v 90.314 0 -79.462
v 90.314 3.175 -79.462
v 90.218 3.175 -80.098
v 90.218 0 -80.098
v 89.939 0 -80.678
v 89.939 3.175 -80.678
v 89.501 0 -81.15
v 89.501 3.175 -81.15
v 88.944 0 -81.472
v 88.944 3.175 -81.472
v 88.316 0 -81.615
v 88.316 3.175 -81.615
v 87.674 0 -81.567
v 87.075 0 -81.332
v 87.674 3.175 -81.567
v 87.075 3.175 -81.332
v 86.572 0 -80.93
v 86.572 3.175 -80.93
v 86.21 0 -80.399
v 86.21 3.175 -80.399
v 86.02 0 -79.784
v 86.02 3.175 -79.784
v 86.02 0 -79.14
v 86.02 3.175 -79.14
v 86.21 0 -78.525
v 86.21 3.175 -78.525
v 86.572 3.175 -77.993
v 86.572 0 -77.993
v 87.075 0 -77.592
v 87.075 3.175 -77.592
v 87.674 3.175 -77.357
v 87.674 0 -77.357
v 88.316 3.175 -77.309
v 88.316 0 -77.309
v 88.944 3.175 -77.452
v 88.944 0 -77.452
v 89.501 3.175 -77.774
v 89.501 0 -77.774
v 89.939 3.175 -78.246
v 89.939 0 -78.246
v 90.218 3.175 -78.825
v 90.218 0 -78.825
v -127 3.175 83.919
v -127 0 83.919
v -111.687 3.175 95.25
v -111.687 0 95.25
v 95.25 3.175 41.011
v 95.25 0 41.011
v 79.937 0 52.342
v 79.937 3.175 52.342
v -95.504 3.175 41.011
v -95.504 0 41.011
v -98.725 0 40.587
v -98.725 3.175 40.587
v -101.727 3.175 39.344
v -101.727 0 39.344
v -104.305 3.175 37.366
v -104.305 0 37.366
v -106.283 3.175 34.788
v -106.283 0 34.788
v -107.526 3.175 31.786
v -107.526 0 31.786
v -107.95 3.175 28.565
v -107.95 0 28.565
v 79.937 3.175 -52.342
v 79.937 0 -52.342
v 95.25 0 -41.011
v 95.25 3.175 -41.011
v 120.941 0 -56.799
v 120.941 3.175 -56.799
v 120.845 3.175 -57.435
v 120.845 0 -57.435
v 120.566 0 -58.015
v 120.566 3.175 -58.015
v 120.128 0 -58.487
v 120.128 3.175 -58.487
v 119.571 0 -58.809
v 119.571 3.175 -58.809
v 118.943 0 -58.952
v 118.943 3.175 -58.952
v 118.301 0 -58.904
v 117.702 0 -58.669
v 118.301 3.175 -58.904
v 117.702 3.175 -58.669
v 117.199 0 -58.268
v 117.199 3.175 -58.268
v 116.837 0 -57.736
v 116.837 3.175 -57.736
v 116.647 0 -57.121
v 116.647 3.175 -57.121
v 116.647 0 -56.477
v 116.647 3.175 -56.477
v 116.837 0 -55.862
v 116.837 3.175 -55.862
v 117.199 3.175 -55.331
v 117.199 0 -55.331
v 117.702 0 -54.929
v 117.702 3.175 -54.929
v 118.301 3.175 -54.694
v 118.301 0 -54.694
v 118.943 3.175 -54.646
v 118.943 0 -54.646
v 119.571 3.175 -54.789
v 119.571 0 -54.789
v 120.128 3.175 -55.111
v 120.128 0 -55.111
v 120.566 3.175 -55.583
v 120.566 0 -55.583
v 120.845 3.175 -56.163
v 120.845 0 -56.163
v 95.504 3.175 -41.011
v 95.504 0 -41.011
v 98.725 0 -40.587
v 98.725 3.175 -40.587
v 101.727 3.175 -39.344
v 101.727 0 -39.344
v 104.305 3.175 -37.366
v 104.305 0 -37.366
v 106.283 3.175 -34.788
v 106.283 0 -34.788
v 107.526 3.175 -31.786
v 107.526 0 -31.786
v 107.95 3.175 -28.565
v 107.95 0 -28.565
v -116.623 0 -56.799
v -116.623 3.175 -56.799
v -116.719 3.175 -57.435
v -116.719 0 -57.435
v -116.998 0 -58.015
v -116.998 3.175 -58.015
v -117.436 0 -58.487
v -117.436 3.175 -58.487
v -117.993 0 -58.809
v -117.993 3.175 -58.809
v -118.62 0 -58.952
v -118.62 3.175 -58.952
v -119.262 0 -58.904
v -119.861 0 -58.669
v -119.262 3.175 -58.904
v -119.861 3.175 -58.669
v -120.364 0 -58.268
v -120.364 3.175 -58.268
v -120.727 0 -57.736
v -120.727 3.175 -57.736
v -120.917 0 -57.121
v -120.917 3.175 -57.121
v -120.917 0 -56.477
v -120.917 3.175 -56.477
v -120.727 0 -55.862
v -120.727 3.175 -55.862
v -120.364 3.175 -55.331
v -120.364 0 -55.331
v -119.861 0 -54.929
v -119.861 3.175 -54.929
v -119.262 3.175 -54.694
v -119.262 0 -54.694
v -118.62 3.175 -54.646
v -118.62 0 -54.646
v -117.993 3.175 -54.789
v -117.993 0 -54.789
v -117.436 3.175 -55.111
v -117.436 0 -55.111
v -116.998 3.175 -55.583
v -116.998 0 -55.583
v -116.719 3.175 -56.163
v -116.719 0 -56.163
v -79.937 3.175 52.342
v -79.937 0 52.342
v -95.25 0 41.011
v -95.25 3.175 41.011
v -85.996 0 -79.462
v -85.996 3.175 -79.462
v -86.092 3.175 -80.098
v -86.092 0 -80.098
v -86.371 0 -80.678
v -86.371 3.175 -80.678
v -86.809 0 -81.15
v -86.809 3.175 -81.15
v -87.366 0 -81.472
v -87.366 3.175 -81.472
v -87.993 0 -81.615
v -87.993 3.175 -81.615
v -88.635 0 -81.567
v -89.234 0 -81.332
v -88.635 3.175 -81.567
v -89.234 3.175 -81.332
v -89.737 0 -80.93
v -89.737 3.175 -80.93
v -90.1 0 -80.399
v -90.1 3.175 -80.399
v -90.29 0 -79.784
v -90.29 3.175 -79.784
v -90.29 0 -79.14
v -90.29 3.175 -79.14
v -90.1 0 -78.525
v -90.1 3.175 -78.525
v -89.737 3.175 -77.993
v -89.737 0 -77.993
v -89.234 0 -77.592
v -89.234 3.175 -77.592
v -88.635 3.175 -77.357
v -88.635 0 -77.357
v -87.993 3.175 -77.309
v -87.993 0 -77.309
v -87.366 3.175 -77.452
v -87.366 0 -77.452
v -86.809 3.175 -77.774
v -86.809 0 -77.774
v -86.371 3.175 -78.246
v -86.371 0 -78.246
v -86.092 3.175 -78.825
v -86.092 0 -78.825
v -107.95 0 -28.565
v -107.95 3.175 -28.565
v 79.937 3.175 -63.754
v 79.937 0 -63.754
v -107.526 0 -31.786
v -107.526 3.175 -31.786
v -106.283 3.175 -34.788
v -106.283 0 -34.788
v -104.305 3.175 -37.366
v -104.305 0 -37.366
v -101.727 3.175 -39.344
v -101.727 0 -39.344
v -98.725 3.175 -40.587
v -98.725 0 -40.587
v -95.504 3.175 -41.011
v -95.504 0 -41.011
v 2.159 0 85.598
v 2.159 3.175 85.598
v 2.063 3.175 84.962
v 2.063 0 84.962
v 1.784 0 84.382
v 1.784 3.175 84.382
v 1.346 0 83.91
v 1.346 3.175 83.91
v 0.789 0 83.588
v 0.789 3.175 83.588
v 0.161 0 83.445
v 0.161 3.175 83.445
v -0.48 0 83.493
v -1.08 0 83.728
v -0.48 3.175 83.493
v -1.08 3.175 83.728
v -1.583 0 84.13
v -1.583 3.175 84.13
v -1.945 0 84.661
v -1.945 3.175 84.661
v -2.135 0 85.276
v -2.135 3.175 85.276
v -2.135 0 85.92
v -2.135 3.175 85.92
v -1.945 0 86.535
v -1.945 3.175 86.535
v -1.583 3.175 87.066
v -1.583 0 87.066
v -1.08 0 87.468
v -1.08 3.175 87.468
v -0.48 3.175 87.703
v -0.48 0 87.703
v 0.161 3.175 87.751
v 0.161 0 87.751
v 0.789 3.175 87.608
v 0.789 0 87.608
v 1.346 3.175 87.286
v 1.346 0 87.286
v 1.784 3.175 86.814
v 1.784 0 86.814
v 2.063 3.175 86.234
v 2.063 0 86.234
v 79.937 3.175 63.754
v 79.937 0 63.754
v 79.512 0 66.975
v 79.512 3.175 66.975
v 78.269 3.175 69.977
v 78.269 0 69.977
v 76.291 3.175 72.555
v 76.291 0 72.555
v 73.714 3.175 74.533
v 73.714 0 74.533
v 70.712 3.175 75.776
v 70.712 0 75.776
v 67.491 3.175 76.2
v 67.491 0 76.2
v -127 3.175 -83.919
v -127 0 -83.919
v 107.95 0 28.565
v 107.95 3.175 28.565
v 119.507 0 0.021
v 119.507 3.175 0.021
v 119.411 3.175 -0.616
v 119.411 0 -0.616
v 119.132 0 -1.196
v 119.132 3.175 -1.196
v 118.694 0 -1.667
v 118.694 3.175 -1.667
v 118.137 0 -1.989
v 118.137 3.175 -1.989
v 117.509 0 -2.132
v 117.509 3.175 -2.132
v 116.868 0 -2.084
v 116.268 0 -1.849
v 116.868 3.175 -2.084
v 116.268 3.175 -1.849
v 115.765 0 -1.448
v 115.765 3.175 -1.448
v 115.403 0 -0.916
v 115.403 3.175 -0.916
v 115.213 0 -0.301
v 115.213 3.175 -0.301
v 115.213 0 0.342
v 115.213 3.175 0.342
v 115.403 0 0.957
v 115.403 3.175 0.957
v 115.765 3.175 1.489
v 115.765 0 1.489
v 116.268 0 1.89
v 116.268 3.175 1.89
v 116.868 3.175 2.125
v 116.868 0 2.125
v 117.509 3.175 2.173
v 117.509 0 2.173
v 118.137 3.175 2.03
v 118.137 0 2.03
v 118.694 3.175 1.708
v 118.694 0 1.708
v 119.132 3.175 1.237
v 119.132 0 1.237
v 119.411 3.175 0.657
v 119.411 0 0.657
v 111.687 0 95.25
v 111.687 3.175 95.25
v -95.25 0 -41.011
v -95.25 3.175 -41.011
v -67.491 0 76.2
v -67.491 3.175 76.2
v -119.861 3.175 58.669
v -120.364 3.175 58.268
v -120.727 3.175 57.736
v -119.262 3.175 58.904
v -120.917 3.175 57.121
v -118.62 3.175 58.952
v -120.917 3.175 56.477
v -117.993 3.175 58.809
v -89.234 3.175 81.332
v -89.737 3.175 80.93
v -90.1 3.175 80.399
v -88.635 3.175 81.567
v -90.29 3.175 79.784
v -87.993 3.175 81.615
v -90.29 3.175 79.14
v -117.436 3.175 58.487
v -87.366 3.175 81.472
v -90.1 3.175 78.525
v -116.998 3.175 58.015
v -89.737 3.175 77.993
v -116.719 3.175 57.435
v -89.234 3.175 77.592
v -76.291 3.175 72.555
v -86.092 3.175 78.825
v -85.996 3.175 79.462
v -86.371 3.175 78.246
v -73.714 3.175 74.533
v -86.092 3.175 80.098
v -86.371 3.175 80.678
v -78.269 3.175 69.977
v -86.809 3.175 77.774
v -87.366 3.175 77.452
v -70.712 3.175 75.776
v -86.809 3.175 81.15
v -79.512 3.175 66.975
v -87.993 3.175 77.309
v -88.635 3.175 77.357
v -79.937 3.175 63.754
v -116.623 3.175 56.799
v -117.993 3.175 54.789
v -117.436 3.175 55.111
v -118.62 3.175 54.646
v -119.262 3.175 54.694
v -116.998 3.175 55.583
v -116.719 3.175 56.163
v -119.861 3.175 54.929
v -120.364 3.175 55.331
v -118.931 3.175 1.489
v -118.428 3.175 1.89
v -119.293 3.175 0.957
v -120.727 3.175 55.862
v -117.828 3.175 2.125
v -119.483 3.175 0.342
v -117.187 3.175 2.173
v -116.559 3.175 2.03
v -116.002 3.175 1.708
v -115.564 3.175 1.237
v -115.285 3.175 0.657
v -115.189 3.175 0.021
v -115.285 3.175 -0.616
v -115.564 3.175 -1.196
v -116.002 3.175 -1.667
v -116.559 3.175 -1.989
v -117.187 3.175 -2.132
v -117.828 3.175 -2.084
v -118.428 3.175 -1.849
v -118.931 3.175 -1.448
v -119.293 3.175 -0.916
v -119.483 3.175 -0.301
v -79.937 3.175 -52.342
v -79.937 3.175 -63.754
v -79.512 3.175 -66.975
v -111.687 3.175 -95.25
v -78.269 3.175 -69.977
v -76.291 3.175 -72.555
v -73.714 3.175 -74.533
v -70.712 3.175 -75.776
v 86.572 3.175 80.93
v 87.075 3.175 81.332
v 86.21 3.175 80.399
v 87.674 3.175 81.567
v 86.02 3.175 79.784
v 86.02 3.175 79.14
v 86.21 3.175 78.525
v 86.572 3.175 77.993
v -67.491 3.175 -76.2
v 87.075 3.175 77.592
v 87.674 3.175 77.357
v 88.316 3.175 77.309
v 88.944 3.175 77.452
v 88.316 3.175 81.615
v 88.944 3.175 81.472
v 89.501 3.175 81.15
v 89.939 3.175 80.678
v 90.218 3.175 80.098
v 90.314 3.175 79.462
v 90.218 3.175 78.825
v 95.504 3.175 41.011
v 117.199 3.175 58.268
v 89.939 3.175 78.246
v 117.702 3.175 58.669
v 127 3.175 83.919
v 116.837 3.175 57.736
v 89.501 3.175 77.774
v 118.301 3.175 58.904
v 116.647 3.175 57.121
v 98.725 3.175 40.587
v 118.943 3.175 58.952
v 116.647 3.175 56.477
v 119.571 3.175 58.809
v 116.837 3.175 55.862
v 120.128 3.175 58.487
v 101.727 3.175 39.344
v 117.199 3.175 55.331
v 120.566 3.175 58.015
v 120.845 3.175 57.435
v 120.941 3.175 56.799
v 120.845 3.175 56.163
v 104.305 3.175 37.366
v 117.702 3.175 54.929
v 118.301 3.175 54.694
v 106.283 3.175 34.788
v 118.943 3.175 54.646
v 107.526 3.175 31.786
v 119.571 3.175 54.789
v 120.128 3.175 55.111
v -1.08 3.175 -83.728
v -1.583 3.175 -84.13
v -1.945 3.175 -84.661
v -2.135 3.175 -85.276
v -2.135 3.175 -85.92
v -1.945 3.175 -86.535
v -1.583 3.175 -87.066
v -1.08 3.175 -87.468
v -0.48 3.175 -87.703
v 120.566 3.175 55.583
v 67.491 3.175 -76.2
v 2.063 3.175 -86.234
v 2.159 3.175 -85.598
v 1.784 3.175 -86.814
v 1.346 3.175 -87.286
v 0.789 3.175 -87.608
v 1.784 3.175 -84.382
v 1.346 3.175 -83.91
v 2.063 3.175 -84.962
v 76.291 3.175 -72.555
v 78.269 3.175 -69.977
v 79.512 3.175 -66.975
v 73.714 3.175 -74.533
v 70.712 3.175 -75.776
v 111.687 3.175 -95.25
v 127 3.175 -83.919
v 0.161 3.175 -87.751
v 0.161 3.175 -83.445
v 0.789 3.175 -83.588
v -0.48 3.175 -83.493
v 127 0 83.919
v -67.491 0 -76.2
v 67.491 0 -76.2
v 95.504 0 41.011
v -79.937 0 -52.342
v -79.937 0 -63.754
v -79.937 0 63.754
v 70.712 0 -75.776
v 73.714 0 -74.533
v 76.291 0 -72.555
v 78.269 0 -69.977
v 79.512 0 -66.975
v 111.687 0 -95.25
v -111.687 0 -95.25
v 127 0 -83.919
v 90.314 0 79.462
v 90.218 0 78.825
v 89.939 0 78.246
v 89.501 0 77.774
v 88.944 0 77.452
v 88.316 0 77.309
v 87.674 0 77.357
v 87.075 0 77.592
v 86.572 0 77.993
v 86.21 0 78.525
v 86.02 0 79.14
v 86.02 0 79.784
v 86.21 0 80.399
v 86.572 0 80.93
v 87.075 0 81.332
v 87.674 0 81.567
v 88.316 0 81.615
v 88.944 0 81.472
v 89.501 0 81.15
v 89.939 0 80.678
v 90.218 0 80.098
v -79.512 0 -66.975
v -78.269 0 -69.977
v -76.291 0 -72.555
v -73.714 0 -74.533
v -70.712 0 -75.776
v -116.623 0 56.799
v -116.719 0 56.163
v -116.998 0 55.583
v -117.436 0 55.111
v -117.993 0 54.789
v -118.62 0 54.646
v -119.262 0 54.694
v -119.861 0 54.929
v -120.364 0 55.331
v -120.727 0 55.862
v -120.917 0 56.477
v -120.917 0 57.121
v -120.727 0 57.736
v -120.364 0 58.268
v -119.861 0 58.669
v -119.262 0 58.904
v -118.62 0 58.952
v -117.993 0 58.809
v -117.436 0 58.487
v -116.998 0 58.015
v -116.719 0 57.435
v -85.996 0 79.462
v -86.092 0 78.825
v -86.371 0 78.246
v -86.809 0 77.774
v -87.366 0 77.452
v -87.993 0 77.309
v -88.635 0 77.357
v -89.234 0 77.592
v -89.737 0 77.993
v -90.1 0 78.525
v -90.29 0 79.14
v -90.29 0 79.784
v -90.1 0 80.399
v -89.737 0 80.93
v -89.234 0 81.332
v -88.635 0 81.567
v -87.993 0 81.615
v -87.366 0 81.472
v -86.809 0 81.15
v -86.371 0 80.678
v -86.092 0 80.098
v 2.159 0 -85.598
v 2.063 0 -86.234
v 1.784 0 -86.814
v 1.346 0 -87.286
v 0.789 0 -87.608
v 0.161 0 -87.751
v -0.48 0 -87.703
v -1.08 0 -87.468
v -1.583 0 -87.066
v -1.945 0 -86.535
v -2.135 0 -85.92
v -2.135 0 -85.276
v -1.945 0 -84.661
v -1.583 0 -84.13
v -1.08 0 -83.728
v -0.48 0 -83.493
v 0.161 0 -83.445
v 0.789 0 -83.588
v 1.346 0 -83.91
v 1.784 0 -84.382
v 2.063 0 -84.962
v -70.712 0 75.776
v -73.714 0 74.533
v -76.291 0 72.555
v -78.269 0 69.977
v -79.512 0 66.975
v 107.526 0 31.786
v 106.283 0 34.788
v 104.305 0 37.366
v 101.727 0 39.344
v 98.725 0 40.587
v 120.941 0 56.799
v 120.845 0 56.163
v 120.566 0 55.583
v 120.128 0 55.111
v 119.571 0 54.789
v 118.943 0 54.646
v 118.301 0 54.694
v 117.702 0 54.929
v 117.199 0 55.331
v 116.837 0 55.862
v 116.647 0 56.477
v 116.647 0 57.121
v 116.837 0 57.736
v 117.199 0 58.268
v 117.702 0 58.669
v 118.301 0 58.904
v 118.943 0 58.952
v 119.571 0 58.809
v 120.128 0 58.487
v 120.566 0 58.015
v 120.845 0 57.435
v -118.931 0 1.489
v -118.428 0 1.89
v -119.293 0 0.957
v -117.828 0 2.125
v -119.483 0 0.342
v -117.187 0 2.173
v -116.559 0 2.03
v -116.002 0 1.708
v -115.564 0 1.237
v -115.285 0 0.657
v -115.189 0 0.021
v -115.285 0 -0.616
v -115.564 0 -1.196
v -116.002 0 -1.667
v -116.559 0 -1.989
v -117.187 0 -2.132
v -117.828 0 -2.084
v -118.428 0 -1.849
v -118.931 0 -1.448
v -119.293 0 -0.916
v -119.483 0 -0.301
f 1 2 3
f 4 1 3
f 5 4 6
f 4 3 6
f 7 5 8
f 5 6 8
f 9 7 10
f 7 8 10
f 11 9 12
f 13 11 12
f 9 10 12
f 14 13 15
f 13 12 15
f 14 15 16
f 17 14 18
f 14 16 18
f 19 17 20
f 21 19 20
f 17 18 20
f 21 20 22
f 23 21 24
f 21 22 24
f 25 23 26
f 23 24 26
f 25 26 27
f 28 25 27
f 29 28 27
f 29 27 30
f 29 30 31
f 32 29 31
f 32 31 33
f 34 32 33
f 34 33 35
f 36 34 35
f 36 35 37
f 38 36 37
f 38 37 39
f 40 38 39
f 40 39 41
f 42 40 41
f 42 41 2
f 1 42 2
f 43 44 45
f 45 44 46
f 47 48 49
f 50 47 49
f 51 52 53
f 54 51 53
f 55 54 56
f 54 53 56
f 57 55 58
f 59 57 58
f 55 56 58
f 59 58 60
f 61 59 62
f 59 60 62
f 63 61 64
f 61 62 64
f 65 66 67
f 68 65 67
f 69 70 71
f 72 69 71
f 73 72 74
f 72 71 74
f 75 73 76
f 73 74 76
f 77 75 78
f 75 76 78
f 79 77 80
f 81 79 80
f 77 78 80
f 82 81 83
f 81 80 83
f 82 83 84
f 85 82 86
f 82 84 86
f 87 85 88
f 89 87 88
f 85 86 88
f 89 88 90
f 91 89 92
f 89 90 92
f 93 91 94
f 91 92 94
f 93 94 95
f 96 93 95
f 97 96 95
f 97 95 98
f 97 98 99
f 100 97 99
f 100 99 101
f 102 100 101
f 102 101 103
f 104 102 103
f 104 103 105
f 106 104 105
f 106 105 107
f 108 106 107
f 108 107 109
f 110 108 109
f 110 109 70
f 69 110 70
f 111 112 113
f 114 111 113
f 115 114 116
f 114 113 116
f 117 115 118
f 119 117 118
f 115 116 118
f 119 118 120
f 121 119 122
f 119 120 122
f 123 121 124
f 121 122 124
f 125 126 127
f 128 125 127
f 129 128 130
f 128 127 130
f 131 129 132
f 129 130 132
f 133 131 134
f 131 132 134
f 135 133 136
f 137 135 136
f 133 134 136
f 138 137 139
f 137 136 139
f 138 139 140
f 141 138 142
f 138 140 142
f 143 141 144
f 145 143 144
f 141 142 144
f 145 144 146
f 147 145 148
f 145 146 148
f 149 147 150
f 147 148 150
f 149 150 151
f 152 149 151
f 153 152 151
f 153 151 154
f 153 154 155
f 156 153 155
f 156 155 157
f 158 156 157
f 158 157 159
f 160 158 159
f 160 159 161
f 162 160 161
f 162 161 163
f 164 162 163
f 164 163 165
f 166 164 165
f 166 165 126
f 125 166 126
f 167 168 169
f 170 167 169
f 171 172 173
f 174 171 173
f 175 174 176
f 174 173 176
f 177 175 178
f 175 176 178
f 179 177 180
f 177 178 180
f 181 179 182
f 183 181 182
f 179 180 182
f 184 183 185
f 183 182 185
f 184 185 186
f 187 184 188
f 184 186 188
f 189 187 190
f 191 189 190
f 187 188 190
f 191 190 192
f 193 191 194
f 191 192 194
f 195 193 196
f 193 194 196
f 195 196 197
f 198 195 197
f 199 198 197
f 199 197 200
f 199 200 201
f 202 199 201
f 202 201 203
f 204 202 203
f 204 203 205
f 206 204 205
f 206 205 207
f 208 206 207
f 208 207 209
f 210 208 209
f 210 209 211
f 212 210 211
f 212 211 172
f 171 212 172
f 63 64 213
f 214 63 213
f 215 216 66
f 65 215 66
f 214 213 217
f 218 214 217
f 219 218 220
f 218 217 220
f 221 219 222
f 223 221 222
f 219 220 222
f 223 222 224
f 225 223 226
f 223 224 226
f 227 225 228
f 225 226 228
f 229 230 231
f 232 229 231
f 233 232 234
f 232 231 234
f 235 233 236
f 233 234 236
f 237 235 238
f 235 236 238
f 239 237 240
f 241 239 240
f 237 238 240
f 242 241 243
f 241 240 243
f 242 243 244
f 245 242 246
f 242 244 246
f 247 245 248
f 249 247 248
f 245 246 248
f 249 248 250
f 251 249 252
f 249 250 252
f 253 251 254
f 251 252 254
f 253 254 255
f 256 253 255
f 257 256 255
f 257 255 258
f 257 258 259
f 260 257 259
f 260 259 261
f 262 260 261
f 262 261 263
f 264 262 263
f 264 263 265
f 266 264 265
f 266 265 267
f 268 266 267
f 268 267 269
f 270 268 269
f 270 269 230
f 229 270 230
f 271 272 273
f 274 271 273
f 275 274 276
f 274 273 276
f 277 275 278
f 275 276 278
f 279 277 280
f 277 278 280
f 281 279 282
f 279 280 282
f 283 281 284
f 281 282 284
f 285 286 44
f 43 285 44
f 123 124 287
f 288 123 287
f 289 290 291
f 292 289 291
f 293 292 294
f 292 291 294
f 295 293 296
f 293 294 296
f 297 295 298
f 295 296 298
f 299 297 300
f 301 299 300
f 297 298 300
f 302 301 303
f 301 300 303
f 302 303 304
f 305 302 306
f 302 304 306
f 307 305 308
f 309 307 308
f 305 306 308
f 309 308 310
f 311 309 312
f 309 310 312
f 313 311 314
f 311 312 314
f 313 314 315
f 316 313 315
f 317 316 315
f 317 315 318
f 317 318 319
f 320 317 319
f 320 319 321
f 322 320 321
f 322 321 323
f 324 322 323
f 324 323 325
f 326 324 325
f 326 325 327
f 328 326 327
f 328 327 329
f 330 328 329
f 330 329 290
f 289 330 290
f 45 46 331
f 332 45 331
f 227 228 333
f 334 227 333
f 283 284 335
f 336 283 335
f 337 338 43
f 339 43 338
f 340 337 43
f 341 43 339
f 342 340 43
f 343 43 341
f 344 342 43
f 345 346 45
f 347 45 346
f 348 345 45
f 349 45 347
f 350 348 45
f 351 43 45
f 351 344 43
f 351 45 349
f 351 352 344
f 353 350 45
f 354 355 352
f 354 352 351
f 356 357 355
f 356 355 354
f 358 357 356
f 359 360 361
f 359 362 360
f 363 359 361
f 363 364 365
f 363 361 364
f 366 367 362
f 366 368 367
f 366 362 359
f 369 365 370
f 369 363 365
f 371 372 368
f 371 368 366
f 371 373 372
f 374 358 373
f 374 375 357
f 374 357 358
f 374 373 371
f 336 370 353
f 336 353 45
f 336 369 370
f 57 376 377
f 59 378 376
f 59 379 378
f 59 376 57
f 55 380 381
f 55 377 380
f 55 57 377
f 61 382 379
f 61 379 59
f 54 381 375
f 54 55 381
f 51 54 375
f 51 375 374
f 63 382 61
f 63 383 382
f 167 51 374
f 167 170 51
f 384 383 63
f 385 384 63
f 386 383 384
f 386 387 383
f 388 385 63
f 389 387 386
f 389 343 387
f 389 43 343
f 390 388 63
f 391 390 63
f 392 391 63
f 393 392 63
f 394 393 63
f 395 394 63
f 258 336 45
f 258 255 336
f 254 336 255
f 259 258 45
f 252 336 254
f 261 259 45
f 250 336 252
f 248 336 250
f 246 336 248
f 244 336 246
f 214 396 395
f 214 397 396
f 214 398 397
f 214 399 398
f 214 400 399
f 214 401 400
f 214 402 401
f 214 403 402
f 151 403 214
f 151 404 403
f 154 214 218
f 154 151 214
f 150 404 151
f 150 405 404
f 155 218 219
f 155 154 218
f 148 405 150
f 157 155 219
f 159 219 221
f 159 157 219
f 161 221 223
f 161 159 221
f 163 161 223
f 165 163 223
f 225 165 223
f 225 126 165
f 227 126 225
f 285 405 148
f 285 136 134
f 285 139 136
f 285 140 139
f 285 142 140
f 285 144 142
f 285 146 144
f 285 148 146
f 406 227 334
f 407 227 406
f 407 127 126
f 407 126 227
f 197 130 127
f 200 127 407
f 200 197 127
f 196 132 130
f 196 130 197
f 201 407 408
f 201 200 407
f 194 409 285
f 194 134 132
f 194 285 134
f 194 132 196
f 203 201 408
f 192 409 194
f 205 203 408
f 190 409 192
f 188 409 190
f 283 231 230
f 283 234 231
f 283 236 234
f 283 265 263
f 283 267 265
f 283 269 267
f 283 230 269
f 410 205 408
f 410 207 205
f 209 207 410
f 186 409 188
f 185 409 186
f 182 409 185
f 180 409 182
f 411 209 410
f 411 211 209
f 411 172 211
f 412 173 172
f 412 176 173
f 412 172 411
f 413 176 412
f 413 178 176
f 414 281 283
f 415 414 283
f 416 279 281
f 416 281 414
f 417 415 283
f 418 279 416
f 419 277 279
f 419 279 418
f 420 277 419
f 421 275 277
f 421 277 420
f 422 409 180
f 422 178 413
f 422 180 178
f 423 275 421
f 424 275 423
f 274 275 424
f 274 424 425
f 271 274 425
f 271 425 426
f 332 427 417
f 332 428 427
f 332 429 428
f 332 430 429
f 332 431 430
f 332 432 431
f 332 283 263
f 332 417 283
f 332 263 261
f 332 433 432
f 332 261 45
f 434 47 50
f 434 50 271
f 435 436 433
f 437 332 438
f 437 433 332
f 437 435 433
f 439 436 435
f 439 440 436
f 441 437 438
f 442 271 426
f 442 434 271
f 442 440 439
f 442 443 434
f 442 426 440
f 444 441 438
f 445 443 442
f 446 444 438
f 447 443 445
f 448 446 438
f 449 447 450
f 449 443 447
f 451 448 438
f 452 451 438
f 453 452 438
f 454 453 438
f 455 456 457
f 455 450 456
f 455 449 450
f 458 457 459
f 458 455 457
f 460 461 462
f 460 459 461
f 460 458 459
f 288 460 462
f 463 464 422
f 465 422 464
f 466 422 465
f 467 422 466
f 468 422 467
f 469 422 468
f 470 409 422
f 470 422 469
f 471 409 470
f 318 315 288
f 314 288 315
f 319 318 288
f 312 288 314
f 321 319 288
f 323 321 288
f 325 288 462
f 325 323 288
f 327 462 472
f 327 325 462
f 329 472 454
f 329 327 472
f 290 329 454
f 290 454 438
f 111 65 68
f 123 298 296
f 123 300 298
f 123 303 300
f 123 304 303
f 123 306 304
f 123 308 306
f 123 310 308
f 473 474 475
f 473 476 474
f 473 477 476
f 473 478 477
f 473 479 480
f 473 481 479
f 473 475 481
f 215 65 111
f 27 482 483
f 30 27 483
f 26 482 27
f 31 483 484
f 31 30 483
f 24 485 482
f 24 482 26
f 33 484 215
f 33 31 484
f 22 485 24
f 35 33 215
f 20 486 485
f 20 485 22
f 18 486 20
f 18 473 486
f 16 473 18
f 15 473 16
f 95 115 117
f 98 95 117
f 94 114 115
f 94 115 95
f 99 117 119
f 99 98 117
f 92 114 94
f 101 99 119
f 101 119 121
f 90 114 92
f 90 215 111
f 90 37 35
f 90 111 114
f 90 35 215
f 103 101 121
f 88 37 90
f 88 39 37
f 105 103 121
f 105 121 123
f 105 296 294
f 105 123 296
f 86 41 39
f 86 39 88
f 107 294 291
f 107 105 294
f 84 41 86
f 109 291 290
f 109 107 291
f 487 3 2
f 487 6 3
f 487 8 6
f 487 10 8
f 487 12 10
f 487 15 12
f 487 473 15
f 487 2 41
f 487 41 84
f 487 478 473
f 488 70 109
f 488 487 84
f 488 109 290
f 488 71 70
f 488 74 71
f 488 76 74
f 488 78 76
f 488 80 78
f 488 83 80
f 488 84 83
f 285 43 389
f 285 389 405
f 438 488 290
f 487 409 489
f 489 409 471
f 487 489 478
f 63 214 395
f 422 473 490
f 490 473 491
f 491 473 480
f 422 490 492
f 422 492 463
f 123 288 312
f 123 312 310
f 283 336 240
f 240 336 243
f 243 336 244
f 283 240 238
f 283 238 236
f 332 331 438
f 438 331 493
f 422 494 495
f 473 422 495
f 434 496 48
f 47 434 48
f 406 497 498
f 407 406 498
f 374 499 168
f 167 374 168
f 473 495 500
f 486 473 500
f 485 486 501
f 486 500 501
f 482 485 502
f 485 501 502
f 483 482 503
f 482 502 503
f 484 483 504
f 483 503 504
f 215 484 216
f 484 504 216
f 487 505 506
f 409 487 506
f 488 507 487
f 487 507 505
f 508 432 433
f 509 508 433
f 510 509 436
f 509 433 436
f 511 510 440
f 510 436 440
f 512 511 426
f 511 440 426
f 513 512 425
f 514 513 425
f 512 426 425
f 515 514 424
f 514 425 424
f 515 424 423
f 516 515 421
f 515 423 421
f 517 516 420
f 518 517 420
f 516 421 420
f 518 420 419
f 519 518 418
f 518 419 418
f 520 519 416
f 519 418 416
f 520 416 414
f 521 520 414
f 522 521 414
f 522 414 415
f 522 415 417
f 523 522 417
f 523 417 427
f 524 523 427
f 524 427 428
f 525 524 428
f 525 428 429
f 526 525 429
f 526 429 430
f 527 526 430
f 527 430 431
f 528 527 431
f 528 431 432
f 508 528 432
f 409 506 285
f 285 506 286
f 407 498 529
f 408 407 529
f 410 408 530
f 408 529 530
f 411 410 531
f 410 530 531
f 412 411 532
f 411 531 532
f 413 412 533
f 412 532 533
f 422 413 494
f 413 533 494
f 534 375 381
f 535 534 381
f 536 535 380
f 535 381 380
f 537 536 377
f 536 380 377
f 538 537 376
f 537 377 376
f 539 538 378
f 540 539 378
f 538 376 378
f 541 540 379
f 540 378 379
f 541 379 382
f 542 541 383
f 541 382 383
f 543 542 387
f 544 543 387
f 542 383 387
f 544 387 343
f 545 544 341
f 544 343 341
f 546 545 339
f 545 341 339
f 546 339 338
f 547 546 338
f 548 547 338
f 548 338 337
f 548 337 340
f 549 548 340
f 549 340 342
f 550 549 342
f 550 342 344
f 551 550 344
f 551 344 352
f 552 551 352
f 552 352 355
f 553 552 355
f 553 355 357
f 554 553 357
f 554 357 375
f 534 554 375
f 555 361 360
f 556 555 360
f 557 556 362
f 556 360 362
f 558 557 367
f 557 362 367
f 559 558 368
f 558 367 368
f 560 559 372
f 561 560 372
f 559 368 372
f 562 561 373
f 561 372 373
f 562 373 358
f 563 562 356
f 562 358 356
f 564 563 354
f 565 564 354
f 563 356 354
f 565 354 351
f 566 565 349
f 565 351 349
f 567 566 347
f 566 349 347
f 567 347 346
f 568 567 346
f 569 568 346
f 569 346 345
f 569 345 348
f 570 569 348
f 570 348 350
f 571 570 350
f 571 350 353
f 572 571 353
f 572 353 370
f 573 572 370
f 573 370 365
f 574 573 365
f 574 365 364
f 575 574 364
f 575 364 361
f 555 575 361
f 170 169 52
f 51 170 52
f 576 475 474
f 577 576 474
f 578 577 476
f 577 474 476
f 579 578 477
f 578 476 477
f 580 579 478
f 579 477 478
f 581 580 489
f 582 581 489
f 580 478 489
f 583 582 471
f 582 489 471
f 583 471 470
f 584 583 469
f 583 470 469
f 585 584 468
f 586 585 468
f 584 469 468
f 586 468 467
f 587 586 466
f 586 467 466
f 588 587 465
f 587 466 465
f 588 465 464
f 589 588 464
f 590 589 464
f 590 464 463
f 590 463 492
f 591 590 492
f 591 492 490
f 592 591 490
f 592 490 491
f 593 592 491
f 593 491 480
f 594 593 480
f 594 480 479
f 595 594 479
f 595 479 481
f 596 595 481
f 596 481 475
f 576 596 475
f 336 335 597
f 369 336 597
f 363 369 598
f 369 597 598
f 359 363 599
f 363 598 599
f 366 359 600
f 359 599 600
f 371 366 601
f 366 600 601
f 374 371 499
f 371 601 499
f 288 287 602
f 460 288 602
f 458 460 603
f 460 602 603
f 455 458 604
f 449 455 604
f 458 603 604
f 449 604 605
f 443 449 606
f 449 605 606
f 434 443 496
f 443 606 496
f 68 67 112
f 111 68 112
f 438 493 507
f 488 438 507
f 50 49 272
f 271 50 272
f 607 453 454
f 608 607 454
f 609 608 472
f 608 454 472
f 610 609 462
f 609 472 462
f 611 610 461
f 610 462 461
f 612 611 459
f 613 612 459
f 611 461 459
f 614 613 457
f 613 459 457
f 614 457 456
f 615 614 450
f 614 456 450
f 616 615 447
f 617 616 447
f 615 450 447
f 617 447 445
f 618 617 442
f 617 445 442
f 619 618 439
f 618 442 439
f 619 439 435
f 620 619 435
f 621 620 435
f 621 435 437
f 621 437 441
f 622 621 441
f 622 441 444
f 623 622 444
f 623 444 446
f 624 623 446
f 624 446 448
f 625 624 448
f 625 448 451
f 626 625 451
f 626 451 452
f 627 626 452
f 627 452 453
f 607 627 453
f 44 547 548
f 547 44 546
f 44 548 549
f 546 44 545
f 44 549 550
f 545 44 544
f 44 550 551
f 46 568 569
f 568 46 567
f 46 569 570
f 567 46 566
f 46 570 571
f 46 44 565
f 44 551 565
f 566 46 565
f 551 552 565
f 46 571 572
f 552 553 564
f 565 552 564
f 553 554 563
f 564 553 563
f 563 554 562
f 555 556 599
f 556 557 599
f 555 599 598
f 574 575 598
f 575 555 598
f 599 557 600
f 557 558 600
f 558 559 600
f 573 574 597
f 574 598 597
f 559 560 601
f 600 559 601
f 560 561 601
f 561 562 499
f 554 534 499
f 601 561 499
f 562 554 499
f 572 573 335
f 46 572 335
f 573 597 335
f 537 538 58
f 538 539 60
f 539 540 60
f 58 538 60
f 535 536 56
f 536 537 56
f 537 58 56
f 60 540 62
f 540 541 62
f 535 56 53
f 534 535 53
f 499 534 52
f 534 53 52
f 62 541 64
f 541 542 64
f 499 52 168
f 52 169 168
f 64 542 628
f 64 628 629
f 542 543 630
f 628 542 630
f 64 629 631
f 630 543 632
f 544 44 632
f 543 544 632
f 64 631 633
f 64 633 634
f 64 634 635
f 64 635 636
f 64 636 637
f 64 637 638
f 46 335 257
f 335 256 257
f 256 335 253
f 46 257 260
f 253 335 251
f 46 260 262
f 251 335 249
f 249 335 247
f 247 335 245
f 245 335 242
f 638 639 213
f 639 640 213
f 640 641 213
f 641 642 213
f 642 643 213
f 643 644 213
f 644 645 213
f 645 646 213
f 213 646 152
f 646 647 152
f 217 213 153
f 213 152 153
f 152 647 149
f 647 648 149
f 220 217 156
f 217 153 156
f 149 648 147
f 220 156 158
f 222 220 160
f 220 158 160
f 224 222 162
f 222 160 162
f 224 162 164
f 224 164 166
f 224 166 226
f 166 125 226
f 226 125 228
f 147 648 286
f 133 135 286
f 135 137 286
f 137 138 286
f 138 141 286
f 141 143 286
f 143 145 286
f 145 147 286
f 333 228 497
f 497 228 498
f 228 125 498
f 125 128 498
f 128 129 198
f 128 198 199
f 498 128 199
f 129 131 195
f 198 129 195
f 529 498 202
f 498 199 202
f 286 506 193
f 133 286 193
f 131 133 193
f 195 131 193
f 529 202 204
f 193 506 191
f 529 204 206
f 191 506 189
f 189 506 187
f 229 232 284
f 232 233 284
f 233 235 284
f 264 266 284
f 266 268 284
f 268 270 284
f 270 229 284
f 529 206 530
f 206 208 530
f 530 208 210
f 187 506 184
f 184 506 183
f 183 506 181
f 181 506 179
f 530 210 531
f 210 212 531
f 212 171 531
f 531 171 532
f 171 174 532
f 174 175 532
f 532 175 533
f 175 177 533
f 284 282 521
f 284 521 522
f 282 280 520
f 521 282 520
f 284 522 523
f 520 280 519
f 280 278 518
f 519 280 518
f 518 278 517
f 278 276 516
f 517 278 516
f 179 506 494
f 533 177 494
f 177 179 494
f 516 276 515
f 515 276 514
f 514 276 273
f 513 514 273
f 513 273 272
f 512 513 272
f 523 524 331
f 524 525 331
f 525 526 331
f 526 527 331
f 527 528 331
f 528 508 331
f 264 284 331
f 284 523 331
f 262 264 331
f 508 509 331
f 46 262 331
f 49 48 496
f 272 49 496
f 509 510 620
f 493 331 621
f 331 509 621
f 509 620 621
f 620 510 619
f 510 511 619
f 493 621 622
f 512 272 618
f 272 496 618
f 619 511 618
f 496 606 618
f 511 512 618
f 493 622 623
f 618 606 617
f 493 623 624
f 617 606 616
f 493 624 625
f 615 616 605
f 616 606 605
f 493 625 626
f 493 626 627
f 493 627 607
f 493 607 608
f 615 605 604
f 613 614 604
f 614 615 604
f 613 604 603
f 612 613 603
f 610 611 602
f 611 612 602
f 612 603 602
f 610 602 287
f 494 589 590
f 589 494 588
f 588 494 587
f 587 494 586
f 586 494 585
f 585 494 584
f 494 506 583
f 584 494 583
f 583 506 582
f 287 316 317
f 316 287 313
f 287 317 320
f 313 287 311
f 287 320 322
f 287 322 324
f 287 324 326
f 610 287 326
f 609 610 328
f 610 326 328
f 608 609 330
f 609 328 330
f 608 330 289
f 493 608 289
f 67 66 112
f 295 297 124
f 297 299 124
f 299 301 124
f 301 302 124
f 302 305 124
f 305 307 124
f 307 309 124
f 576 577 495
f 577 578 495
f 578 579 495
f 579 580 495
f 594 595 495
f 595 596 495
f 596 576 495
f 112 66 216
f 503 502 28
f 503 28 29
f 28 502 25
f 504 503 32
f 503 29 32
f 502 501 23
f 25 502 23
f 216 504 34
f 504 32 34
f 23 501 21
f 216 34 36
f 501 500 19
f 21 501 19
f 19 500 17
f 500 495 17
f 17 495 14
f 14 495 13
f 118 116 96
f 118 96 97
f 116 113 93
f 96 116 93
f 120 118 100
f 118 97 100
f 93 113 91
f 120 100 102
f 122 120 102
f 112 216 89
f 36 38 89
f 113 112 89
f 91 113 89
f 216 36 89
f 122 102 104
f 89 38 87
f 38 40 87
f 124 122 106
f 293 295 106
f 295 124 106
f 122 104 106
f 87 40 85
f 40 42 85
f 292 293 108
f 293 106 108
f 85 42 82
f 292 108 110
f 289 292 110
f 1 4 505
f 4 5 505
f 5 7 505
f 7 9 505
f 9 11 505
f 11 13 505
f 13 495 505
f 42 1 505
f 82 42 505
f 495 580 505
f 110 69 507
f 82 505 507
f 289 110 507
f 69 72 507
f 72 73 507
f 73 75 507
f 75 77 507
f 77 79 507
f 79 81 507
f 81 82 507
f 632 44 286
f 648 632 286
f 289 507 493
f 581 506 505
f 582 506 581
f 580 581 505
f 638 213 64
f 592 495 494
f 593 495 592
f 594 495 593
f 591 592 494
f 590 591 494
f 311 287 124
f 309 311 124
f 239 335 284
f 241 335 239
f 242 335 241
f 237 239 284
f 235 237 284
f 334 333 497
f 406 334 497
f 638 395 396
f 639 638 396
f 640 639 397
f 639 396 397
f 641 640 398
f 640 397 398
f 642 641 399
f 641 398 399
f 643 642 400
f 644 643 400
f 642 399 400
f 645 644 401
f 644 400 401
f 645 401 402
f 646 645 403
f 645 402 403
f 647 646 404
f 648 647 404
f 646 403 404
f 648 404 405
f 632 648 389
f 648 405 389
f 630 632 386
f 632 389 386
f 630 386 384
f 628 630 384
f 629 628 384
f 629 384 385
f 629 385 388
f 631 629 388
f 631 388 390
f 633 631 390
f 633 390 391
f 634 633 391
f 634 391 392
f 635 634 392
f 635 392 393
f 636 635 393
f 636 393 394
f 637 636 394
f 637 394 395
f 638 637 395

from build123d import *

# Parameters (mm, degrees)
BOSS_EXTRUDE1_DEPTH = 3.175
SKETCH2_R           = 2.159
CUT_EXTRUDE1_DEPTH  = 4.175


with BuildPart() as part:
    # Sketch1 → Boss-Extrude1 (new body)
    with BuildSketch(Plane(origin=(0, 0, 0), x_dir=(1, 0, 0), z_dir=(0, 1, 0))):
        Polygon((-111.686526805, 95.25), (-127, 83.918625912), (-127, -83.918625912), (-111.686526805, -95.25), (111.686526805, -95.25), (127, -83.918625912), (127, 83.918625912), (111.686526805, 95.25), align=None)
        with BuildLine():
            Line((-107.95, -28.564963508), (-107.95, 28.564963508))
            ThreePointArc((-107.95, 28.564963508), (-104.304650999, 37.365614506), (-95.504, 41.010963508))
            Line((-95.504, 41.010963508), (-95.25, 41.010963508))
            Line((-95.25, 41.010963508), (-79.936526805, 52.342337595))
            Line((-79.936526805, 52.342337595), (-79.936526805, 63.754))
            ThreePointArc((-79.936526805, 63.754), (-76.291177804, 72.554650999), (-67.490526805, 76.2))
            Line((-67.490526805, 76.2), (38.831798823, 76.2))
            Line((38.831798823, 76.2), (67.490526805, 76.2))
            ThreePointArc((67.490526805, 76.2), (76.291177804, 72.554650999), (79.936526805, 63.754))
            Line((79.936526805, 63.754), (79.936526805, 52.342337595))
            Line((79.936526805, 52.342337595), (95.25, 41.010963508))
            Line((95.25, 41.010963508), (95.504, 41.010963508))
            ThreePointArc((95.504, 41.010963508), (104.304650999, 37.365614506), (107.95, 28.564963508))
            Line((107.95, 28.564963508), (107.95, -28.564963508))
            ThreePointArc((107.95, -28.564963508), (104.304650999, -37.365614506), (95.504, -41.010963508))
            Line((95.504, -41.010963508), (95.25, -41.010963508))
            Line((95.25, -41.010963508), (79.936526805, -52.342337595))
            Line((79.936526805, -52.342337595), (79.936526805, -63.754))
            ThreePointArc((79.936526805, -63.754), (76.291177804, -72.554650999), (67.490526805, -76.2))
            Line((67.490526805, -76.2), (38.1, -76.2))
            Line((38.1, -76.2), (-67.490526805, -76.2))
            ThreePointArc((-67.490526805, -76.2), (-76.291177804, -72.554650999), (-79.936526805, -63.754))
            Line((-79.936526805, -63.754), (-79.936526805, -52.342337595))
            Line((-79.936526805, -52.342337595), (-95.25, -41.010963508))
            Line((-95.25, -41.010963508), (-95.504, -41.010963508))
            ThreePointArc((-95.504, -41.010963508), (-104.304650999, -37.365614506), (-107.95, -28.564963508))
        make_face(mode=Mode.SUBTRACT)
    extrude(amount=BOSS_EXTRUDE1_DEPTH)

    # Sketch2 → Cut-Extrude1 (cut, through all)
    with BuildSketch(Plane(origin=(0, 3.175, 0), x_dir=(1, 0, 0), z_dir=(0, 1, 0))):
        with Locations((-88.154790208, 79.461855841)):
            Circle(SKETCH2_R)
        with Locations((88.154790208, 79.461855841)):
            Circle(SKETCH2_R)
        with Locations((88.154790208, -79.461855841)):
            Circle(SKETCH2_R)
        with Locations((-88.154790208, -79.461855841)):
            Circle(SKETCH2_R)
        with Locations((-118.781736597, 56.799107666)):
            Circle(SKETCH2_R)
        with Locations((118.781736597, 56.799107666)):
            Circle(SKETCH2_R)
        with Locations((-118.781736597, -56.799107666)):
            Circle(SKETCH2_R)
        with Locations((118.781736597, -56.799107666)):
            Circle(SKETCH2_R)
        with Locations((0, -85.598)):
            Circle(SKETCH2_R)
        with Locations((0, 85.598)):
            Circle(SKETCH2_R)
        with Locations((-117.348, -0.020516524)):
            Circle(SKETCH2_R)
        with Locations((117.348, -0.020516524)):
            Circle(SKETCH2_R)
    extrude(amount=-CUT_EXTRUDE1_DEPTH, mode=Mode.SUBTRACT)


solid = part.part
